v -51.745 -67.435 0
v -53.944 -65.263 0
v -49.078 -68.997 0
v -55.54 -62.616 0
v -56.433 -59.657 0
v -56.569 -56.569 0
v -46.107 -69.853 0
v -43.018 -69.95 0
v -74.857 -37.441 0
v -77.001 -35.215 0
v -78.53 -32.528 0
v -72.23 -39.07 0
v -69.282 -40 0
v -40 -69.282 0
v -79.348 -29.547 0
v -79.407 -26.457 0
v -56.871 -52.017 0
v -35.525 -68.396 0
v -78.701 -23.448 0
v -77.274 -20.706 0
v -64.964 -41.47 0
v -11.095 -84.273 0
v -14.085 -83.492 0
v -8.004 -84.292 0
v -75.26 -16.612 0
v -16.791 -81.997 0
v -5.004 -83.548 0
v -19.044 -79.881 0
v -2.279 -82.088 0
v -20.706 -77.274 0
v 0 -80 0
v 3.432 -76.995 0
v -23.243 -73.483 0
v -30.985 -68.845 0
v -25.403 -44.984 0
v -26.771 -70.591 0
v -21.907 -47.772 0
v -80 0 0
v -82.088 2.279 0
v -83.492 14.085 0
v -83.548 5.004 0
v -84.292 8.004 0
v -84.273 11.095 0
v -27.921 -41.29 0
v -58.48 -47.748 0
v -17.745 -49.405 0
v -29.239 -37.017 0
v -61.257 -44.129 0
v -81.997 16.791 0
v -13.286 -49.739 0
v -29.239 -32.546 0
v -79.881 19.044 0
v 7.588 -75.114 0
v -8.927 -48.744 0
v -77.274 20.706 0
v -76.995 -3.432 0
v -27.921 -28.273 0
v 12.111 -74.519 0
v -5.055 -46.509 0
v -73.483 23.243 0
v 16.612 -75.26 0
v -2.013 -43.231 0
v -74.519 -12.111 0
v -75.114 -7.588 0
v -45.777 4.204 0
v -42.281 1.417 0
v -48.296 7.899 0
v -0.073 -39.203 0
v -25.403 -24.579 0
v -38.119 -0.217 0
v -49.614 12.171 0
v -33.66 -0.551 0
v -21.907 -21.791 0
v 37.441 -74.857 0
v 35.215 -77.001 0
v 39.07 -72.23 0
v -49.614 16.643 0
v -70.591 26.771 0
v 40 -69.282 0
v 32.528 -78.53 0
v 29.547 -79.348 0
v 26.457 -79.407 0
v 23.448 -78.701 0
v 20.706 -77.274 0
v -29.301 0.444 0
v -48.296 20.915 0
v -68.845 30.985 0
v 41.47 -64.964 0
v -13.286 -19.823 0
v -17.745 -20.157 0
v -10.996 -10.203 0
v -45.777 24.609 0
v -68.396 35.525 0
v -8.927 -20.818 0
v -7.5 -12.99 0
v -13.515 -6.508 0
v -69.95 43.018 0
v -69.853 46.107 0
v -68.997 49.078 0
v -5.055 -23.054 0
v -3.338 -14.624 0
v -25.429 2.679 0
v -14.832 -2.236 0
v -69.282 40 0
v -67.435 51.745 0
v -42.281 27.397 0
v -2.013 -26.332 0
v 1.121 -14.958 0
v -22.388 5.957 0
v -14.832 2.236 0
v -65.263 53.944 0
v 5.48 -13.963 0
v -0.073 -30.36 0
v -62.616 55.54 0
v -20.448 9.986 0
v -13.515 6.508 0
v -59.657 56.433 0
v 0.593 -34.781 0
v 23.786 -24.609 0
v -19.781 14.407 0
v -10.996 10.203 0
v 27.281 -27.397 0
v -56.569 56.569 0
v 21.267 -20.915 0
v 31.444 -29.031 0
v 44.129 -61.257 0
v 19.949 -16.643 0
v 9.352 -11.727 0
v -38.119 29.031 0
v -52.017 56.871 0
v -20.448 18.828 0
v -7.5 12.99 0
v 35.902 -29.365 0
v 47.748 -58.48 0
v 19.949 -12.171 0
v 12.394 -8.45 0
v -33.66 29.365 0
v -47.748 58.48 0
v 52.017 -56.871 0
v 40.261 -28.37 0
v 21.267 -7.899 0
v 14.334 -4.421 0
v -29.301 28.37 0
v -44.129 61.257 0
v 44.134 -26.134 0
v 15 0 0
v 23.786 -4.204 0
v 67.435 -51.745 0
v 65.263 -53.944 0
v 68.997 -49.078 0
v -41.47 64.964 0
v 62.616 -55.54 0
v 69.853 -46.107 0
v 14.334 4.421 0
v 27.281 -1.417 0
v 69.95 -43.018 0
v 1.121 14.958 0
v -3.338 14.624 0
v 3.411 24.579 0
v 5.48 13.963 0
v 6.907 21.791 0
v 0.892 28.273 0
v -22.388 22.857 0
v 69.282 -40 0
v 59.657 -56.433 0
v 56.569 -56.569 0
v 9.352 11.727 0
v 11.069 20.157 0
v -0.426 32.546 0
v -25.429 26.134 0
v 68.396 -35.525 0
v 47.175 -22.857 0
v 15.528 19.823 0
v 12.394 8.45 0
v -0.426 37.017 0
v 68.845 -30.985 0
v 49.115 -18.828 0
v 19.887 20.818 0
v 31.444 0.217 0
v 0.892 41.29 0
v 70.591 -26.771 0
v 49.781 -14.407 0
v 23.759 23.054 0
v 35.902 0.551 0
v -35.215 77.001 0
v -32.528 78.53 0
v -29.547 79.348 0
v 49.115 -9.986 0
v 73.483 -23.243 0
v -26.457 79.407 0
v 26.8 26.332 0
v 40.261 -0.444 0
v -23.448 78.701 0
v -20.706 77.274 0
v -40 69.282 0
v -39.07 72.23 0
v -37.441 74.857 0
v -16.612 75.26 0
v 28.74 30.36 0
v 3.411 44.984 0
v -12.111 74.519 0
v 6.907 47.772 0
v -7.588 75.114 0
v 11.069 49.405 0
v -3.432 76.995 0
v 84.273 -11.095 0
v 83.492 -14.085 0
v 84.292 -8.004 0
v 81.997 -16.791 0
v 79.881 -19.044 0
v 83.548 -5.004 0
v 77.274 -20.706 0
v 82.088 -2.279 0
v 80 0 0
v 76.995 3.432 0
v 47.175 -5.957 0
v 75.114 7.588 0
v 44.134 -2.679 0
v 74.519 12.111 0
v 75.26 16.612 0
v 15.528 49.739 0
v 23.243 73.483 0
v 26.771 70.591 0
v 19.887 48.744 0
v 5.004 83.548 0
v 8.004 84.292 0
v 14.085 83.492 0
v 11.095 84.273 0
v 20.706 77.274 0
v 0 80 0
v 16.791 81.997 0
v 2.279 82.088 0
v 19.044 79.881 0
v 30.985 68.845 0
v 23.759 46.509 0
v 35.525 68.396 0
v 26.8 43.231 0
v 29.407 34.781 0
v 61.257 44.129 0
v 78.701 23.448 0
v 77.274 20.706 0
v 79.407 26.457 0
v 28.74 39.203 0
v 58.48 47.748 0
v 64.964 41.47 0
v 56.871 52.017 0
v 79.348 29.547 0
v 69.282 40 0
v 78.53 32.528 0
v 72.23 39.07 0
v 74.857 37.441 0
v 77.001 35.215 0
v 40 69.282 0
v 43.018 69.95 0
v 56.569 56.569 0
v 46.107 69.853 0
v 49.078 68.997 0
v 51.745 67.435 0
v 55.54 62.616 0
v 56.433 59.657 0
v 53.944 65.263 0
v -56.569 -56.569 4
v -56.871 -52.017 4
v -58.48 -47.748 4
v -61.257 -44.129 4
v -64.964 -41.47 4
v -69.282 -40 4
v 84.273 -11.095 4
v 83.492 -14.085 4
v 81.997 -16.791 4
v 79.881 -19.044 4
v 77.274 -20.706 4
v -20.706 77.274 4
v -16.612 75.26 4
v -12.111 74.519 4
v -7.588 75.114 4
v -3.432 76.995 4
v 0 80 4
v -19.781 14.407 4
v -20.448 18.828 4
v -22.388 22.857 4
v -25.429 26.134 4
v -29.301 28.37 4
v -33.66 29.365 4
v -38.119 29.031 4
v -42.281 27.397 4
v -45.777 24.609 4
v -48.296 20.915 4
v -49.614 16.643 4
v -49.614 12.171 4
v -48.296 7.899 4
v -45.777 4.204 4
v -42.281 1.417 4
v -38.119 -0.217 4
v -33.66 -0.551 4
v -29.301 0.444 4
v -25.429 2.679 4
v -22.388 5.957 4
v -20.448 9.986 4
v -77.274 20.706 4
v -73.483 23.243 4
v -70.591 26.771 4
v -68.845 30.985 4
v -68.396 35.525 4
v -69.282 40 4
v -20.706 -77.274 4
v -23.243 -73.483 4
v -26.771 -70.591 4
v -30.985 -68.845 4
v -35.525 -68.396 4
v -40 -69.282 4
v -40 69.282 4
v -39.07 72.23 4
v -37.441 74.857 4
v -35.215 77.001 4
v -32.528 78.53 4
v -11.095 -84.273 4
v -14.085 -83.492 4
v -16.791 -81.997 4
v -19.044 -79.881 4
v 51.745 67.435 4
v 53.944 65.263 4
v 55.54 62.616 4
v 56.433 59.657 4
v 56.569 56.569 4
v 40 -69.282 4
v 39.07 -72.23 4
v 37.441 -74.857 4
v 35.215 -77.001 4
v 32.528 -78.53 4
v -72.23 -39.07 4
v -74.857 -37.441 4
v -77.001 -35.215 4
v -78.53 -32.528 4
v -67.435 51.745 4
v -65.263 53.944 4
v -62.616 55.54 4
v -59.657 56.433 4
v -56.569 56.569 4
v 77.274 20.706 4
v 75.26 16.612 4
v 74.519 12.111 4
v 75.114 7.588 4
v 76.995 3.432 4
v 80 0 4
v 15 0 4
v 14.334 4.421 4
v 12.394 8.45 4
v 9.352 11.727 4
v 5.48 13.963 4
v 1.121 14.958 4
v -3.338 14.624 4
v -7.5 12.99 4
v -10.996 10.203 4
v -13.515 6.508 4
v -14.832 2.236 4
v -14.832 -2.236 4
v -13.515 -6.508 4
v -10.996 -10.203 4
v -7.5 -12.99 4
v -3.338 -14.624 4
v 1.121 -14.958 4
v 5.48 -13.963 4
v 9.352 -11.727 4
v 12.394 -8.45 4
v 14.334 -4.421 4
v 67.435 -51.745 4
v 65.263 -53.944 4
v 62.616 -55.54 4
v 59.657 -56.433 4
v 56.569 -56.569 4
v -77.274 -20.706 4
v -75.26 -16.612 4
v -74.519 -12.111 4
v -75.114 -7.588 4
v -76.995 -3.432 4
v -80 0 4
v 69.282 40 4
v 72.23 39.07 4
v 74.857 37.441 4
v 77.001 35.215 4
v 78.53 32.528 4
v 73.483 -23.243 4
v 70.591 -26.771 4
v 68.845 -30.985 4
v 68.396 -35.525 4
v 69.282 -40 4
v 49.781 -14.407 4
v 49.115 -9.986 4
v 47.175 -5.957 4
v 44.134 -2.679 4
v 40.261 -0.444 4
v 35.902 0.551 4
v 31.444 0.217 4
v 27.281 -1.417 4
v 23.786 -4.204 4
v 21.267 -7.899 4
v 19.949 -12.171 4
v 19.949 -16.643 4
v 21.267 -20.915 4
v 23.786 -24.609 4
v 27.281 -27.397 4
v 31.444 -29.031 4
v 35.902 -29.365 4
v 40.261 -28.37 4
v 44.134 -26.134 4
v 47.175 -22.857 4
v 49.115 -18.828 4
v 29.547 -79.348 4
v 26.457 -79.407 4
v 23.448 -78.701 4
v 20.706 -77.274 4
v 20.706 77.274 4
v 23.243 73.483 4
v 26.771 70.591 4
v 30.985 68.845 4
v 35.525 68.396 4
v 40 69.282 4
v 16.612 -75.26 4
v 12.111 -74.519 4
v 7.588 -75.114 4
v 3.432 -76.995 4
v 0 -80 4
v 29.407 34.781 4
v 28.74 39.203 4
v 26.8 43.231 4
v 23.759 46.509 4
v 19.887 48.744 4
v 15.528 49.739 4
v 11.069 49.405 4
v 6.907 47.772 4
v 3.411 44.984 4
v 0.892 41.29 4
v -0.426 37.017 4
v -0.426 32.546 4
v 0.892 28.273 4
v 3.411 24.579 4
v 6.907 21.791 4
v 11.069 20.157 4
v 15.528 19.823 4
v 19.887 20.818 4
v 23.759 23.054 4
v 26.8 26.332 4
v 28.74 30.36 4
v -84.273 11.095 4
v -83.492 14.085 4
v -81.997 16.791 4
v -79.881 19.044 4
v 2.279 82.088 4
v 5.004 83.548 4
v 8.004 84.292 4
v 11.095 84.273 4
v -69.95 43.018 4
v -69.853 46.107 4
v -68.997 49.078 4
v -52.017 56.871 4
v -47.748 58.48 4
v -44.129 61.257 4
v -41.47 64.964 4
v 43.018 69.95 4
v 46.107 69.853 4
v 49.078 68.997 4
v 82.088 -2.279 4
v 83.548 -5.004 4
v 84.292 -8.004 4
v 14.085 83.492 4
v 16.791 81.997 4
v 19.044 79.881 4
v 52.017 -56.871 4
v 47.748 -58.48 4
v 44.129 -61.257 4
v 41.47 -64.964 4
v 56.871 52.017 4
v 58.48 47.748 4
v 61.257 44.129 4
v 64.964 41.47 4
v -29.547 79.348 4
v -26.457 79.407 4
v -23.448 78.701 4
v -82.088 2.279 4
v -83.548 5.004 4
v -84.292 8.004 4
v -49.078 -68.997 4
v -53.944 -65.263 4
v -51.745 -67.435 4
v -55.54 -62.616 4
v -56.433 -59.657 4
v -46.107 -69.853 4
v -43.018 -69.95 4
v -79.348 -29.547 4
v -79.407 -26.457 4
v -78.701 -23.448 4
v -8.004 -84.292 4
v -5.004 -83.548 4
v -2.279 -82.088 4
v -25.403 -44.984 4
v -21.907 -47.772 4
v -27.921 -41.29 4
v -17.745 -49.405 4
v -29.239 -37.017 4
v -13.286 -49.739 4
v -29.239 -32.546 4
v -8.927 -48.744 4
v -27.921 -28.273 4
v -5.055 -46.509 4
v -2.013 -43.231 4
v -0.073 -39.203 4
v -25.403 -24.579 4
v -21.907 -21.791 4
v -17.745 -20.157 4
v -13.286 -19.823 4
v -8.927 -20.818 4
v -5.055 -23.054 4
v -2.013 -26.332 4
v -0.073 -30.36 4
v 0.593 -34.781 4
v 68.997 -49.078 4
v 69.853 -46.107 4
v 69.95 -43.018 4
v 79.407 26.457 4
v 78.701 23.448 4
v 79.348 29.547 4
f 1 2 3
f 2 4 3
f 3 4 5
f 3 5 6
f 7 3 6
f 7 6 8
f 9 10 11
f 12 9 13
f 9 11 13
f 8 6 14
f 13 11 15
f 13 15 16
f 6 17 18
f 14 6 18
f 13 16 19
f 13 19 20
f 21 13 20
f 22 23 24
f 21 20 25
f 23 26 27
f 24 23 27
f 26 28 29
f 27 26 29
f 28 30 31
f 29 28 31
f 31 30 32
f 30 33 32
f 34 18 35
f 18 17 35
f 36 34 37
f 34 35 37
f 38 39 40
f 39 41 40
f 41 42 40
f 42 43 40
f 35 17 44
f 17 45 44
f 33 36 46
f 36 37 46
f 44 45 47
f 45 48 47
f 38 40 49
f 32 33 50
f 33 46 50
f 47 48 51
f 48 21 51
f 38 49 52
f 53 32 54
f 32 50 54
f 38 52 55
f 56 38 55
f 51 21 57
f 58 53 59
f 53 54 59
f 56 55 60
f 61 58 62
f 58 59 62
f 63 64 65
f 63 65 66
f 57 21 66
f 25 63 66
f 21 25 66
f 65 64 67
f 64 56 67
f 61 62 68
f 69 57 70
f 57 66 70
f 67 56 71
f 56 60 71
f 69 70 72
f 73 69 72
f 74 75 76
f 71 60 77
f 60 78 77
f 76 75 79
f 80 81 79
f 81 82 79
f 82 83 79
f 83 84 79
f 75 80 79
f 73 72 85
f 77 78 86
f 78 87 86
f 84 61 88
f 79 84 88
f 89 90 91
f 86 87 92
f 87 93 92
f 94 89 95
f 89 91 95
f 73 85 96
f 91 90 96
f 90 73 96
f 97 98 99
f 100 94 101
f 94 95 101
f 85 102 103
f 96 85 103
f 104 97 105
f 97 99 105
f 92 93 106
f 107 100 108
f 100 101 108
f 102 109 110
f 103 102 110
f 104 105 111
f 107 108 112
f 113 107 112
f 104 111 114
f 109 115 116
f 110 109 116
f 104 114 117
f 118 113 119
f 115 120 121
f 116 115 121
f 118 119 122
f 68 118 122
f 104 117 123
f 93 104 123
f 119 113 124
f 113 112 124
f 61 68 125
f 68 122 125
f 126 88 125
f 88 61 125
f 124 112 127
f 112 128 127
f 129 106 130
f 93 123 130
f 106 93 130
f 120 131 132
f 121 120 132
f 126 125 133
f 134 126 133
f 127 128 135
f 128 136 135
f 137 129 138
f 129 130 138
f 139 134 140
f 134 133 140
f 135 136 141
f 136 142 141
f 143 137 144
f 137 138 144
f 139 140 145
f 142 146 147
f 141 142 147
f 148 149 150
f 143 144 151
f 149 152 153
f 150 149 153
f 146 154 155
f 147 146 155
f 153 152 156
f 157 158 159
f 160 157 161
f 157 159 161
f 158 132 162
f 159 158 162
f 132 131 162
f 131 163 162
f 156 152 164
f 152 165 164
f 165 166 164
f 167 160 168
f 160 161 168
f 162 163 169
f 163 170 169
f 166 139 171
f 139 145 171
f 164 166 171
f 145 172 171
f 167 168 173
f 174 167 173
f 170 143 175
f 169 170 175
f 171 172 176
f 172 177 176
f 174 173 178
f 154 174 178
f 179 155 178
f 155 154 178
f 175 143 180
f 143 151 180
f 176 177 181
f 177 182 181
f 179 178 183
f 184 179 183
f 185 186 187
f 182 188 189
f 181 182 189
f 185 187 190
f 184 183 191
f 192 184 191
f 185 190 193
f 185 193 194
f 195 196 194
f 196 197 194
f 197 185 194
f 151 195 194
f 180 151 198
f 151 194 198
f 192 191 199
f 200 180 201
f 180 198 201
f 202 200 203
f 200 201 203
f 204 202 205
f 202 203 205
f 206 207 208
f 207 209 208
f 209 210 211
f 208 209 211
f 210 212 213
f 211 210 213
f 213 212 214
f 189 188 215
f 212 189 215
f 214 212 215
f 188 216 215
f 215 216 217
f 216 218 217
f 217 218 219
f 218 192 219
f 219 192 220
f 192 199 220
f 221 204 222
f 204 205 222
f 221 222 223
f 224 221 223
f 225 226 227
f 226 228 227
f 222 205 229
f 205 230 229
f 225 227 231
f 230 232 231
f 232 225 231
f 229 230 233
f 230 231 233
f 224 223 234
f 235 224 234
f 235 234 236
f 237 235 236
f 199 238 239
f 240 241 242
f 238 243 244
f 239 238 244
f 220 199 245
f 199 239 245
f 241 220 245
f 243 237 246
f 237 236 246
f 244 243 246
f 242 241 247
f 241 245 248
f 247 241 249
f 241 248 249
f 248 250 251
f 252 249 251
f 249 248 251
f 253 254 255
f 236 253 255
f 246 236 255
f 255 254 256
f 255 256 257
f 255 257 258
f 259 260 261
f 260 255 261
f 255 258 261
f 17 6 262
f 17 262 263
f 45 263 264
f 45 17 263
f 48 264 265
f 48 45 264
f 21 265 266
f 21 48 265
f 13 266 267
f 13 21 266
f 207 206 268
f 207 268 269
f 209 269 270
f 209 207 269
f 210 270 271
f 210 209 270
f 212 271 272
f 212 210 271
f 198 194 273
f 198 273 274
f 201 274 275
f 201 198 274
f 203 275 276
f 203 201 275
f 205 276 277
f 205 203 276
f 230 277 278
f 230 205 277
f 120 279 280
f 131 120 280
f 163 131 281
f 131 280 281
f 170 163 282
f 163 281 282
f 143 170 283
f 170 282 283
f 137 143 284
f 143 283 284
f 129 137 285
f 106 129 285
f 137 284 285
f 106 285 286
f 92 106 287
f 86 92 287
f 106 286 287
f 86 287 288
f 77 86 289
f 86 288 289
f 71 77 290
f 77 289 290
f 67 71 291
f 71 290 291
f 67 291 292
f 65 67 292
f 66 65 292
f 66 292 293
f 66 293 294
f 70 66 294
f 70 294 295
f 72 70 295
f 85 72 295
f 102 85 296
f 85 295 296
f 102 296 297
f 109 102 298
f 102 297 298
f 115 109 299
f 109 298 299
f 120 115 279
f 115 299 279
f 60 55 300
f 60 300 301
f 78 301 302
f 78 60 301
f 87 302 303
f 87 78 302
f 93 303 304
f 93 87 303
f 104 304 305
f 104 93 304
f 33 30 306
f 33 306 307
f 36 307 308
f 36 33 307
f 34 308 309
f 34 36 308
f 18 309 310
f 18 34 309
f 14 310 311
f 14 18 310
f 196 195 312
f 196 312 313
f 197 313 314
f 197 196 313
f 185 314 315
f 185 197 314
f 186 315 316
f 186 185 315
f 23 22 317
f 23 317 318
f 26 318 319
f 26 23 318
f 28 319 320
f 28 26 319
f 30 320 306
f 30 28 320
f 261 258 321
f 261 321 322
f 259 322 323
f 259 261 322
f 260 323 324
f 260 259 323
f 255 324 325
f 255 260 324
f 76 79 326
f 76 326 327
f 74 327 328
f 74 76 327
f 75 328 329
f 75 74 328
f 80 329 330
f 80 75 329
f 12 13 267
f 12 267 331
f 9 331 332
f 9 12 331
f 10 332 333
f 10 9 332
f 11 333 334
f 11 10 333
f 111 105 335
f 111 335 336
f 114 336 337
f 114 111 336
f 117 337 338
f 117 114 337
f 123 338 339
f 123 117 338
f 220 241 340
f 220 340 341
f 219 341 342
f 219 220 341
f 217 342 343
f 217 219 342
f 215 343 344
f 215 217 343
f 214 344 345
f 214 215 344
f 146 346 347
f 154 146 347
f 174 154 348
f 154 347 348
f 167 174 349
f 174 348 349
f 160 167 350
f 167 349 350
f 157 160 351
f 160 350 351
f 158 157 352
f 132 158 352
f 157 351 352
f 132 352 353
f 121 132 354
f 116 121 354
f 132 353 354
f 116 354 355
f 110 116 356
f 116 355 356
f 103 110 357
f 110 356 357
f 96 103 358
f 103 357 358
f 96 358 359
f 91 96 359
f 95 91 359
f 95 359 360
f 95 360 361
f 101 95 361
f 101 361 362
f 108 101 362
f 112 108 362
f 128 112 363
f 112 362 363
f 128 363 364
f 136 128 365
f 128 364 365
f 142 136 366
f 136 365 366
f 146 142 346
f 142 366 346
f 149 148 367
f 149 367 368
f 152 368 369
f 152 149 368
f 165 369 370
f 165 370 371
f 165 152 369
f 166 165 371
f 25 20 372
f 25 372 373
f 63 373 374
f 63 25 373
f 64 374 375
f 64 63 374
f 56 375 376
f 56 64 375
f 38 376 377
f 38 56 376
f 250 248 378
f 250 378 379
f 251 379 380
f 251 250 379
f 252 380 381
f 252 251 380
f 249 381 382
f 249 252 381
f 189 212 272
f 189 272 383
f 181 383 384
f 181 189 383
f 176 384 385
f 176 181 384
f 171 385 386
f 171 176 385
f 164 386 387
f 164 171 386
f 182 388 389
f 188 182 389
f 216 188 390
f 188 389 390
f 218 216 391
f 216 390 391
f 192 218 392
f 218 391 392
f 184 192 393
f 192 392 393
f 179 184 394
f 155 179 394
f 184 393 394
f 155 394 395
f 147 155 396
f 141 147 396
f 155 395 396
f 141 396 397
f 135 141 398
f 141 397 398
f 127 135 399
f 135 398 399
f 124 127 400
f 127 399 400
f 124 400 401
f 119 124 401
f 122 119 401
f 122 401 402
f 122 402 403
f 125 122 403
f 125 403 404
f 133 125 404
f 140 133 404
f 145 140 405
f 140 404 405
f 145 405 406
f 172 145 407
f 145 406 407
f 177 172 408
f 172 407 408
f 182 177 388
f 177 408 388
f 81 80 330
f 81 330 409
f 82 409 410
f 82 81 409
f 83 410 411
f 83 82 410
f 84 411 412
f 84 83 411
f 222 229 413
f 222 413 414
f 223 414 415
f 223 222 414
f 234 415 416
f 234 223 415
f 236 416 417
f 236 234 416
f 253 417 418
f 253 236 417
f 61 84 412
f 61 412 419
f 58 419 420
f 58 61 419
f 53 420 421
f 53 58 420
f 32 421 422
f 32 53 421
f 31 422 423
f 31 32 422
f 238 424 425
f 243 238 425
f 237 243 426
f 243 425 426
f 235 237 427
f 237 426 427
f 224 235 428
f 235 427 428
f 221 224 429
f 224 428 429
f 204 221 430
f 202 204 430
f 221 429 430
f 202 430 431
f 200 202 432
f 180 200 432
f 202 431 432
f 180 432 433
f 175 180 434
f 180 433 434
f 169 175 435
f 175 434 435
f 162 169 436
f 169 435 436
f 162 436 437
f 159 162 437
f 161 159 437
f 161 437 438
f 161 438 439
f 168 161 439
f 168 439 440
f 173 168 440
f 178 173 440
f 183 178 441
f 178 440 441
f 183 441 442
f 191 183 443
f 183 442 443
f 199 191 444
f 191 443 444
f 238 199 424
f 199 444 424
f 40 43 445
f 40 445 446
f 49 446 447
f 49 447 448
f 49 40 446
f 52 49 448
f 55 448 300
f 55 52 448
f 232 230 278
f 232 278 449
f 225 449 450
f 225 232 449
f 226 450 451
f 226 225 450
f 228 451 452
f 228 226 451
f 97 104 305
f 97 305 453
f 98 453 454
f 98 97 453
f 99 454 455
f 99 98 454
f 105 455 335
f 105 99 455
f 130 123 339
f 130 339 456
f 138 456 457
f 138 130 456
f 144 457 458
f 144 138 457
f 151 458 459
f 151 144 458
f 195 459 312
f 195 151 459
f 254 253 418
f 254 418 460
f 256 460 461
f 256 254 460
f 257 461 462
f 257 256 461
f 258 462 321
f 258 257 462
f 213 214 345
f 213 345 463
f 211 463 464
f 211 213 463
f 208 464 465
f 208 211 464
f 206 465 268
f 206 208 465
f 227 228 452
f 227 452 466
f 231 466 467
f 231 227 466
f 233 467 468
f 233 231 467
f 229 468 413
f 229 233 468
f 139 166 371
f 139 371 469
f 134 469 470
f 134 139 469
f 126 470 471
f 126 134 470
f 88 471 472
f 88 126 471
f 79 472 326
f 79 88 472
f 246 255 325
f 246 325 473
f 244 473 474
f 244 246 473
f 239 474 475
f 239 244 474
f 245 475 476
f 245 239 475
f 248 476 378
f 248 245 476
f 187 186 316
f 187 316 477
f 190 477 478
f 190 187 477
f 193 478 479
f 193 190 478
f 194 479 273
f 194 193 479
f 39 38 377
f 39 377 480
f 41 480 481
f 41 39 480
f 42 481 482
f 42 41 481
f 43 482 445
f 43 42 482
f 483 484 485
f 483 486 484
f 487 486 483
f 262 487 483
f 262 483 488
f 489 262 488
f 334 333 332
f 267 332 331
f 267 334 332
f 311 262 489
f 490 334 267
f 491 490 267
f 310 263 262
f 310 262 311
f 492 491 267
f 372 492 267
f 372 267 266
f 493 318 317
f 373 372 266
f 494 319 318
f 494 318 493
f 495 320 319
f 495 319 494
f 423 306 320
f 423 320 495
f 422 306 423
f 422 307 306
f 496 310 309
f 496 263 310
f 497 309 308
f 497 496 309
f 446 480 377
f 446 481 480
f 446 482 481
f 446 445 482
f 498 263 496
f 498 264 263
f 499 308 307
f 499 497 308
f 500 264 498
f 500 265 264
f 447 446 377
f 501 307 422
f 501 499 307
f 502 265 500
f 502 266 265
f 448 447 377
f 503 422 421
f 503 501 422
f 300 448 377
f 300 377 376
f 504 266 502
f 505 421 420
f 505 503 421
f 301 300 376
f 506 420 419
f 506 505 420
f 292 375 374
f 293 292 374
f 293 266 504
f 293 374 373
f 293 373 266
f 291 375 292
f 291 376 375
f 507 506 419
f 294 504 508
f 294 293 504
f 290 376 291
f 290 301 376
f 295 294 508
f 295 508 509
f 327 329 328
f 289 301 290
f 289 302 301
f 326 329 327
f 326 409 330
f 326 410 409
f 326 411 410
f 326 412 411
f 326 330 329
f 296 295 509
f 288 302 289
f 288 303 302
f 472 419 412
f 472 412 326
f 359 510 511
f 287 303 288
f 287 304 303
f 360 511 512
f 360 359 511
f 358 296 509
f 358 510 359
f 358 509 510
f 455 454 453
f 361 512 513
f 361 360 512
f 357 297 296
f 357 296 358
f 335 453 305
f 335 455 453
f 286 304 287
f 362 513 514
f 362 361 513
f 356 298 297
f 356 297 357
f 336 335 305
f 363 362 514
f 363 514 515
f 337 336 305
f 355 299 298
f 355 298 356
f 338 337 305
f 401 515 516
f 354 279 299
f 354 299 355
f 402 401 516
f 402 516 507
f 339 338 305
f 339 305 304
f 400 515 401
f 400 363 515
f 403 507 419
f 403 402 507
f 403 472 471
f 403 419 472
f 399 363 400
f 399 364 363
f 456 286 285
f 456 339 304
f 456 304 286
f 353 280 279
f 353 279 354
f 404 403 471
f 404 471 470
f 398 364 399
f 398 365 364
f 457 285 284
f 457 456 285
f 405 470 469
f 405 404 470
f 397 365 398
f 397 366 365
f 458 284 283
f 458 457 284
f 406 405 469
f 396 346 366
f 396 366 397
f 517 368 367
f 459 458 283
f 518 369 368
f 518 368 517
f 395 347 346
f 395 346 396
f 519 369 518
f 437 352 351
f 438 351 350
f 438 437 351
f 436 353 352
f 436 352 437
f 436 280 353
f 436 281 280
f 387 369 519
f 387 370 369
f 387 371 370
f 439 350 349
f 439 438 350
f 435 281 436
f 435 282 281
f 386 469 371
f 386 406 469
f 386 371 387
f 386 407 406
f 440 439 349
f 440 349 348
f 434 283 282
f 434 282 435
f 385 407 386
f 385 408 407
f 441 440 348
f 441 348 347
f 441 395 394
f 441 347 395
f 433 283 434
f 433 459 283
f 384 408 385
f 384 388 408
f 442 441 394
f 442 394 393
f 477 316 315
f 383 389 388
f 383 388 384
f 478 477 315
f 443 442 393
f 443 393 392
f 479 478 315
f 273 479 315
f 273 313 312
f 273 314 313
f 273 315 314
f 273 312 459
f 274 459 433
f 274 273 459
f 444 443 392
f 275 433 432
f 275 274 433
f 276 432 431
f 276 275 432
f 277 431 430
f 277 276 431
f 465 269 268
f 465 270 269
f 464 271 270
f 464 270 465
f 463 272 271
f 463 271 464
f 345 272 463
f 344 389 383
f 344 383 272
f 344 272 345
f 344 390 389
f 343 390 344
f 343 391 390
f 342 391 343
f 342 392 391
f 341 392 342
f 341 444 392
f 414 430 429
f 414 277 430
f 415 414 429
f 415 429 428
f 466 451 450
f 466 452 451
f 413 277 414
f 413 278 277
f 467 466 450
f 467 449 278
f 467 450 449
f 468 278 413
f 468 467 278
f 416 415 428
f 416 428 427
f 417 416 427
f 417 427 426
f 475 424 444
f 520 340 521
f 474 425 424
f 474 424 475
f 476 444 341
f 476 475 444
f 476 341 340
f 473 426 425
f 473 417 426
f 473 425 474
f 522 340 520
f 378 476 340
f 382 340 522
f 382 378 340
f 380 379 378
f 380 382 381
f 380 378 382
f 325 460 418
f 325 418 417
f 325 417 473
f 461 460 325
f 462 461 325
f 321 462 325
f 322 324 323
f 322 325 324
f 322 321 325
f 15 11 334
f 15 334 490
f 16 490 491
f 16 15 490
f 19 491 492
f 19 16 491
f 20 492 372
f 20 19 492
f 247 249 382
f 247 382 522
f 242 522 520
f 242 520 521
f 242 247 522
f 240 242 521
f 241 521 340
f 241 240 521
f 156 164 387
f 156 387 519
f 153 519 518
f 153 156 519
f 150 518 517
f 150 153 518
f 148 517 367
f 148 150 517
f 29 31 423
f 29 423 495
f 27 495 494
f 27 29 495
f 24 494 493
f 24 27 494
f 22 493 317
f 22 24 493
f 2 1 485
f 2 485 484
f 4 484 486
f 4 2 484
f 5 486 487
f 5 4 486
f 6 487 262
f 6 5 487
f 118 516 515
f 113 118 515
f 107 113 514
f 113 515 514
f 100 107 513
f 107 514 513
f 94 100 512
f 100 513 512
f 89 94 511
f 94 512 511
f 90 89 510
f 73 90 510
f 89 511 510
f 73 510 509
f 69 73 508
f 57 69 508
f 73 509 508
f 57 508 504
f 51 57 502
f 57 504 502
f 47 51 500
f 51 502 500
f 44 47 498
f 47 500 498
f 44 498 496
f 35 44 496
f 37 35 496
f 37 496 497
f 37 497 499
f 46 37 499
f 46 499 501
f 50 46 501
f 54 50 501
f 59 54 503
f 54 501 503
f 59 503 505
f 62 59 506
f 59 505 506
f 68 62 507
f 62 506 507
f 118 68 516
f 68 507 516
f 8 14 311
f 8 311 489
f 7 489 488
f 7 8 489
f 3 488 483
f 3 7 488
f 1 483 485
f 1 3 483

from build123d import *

# Parameters (mm, degrees)
CROQUIS3_R              = 85
SALIENTE_EXTRUIR1_DEPTH = 4
CORTAR_EXTRUIR1_START   = -4
CORTAR_EXTRUIR1_DEPTH   = 4
CROQUIS5_R              = 15
CORTAR_EXTRUIR2_DEPTH   = 4
CROQUIS6_R              = 15
CORTAR_EXTRUIR3_DEPTH   = 4


with BuildPart() as part:
    # Croquis3 → Saliente-Extruir1 (new body)
    with BuildSketch(Plane.XY):
        Circle(CROQUIS3_R)
    extrude(amount=SALIENTE_EXTRUIR1_DEPTH)

    # Croquis4 → Cortar-Extruir1 (cut)
    with BuildSketch(Plane.XY.offset(4).offset(CORTAR_EXTRUIR1_START)):
        with BuildLine():
            ThreePointArc((51.744720944, 67.435034325), (32.528091082, 78.52976054), (11.094725556, 84.27281332))
            ThreePointArc((11.094725556, 84.27281332), (16.790892389, 81.996657131), (20.705523608, 77.274066103))
            ThreePointArc((20.705523608, 77.274066103), (28.813811378, 69.562694213), (40, 69.282032303))
            ThreePointArc((40, 69.282032303), (46.107437706, 69.853346275), (51.744720944, 67.435034325))
        make_face()
        with BuildLine():
            ThreePointArc((-20.705523608, 77.274066103), (-10.442095378, 79.31558891), (0, 80))
            ThreePointArc((0, 80), (5.003539158, 83.548491243), (11.094725556, 84.27281332))
            ThreePointArc((11.094725556, 84.27281332), (-11.094726837, 84.272813151), (-32.52809195, 78.529760181))
            ThreePointArc((-32.52809195, 78.529760181), (-26.456988918, 79.406634265), (-20.705523608, 77.274066103))
        make_face()
        with BuildLine():
            ThreePointArc((-20.705523608, 77.274066103), (-9.827854473, 74.649966033), (0, 80))
            ThreePointArc((0, 80), (-10.442095378, 79.31558891), (-20.705523608, 77.274066103))
        make_face()
        with BuildLine():
            ThreePointArc((-40, 69.282032303), (-37.441053421, 74.856885666), (-32.52809195, 78.529760181))
            ThreePointArc((-32.52809195, 78.529760181), (-51.744721795, 67.435033672), (-67.435034299, 51.744720978))
            ThreePointArc((-67.435034299, 51.744720978), (-62.615741826, 55.539667962), (-56.568542495, 56.568542495))
            ThreePointArc((-56.568542495, 56.568542495), (-48.700914321, 63.468267223), (-40, 69.282032303))
        make_face()
        with BuildLine():
            ThreePointArc((-56.568542495, 56.568542495), (-45.836154655, 59.73483974), (-40, 69.282032303))
            ThreePointArc((-40, 69.282032303), (-48.700914321, 63.468267223), (-56.568542495, 56.568542495))
        make_face()
        with BuildLine():
            ThreePointArc((-69.282032303, 40), (-69.853346272, 46.107437728), (-67.435034299, 51.744720978))
            ThreePointArc((-67.435034299, 51.744720978), (-78.529760525, 32.528091121), (-84.272813315, 11.094725594))
            ThreePointArc((-84.272813315, 11.094725594), (-81.996657119, 16.790892405), (-77.274066103, 20.705523608))
            ThreePointArc((-77.274066103, 20.705523608), (-73.910362601, 30.614674589), (-69.282032303, 40))
        make_face()
        with BuildLine():
            ThreePointArc((-77.274066103, 20.705523608), (-69.562694213, 28.813811378), (-69.282032303, 40))
            ThreePointArc((-69.282032303, 40), (-73.910362601, 30.614674589), (-77.274066103, 20.705523608))
        make_face()
        with BuildLine():
            ThreePointArc((-80, 0), (-83.54849125, 5.003539176), (-84.272813315, 11.094725594))
            ThreePointArc((-84.272813315, 11.094725594), (-84.272813233, -11.094726218), (-78.529760644, -32.528090833))
            ThreePointArc((-78.529760644, -32.528090833), (-79.406634201, -26.456988317), (-77.274066103, -20.705523608))
            ThreePointArc((-77.274066103, -20.705523608), (-79.31558891, -10.442095378), (-80, 0))
        make_face()
        with BuildLine():
            ThreePointArc((-77.274066103, -20.705523608), (-74.649966033, -9.827854473), (-80, 0))
            ThreePointArc((-80, 0), (-79.31558891, -10.442095378), (-77.274066103, -20.705523608))
        make_face()
        with BuildLine():
            ThreePointArc((-69.282032303, -40), (-74.856886137, -37.441053042), (-78.529760644, -32.528090833))
            ThreePointArc((-78.529760644, -32.528090833), (-67.435033831, -51.744721588), (-51.744720432, -67.435034718))
            ThreePointArc((-51.744720432, -67.435034718), (-55.539667823, -62.61574214), (-56.568542495, -56.568542495))
            ThreePointArc((-56.568542495, -56.568542495), (-63.468267223, -48.700914321), (-69.282032303, -40))
        make_face()
        with BuildLine():
            ThreePointArc((-56.568542495, -56.568542495), (-59.73483974, -45.836154655), (-69.282032303, -40))
            ThreePointArc((-69.282032303, -40), (-63.468267223, -48.700914321), (-56.568542495, -56.568542495))
        make_face()
        with BuildLine():
            ThreePointArc((-40, -69.282032303), (-46.107437388, -69.853346325), (-51.744720432, -67.435034718))
            ThreePointArc((-51.744720432, -67.435034718), (-32.528090639, -78.529760724), (-11.094725244, -84.272813361))
            ThreePointArc((-11.094725244, -84.272813361), (-16.790892262, -81.996657223), (-20.705523608, -77.274066103))
            ThreePointArc((-20.705523608, -77.274066103), (-30.614674589, -73.910362601), (-40, -69.282032303))
        make_face()
        with BuildLine():
            ThreePointArc((-20.705523608, -77.274066103), (-28.813811378, -69.562694213), (-40, -69.282032303))
            ThreePointArc((-40, -69.282032303), (-30.614674589, -73.910362601), (-20.705523608, -77.274066103))
        make_face()
        with BuildLine():
            ThreePointArc((-11.094725244, -84.272813361), (11.09472631, -84.272813221), (32.528090677, -78.529760708))
            ThreePointArc((32.528090677, -78.529760708), (26.456988234, -79.406634192), (20.705523608, -77.274066103))
            ThreePointArc((20.705523608, -77.274066103), (10.442095378, -79.31558891), (0, -80))
            ThreePointArc((0, -80), (-5.003539011, -83.548491186), (-11.094725244, -84.272813361))
        make_face()
        with BuildLine():
            ThreePointArc((0, -80), (10.442095378, -79.31558891), (20.705523608, -77.274066103))
            ThreePointArc((20.705523608, -77.274066103), (9.827854473, -74.649966033), (0, -80))
        make_face()
        with BuildLine():
            ThreePointArc((40, -69.282032303), (48.700914321, -63.468267223), (56.568542495, -56.568542495))
            ThreePointArc((56.568542495, -56.568542495), (45.836154655, -59.73483974), (40, -69.282032303))
        make_face()
        with BuildLine():
            ThreePointArc((32.528090677, -78.529760708), (51.74472148, -67.435033914), (67.435034654, -51.744720516))
            ThreePointArc((67.435034654, -51.744720516), (62.615742092, -55.539667844), (56.568542495, -56.568542495))
            ThreePointArc((56.568542495, -56.568542495), (48.700914321, -63.468267223), (40, -69.282032303))
            ThreePointArc((40, -69.282032303), (37.441052989, -74.856886202), (32.528090677, -78.529760708))
        make_face()
        with BuildLine():
            ThreePointArc((67.435034654, -51.744720516), (78.529760638, -32.528090847), (84.272813316, -11.094725585))
            ThreePointArc((84.272813316, -11.094725585), (81.996657122, -16.790892401), (77.274066103, -20.705523608))
            ThreePointArc((77.274066103, -20.705523608), (73.910362601, -30.614674589), (69.282032303, -40))
            ThreePointArc((69.282032303, -40), (69.853346317, -46.10743744), (67.435034654, -51.744720516))
        make_face()
        with BuildLine():
            ThreePointArc((69.282032303, -40), (73.910362601, -30.614674589), (77.274066103, -20.705523608))
            ThreePointArc((77.274066103, -20.705523608), (69.562694213, -28.813811378), (69.282032303, -40))
        make_face()
        with BuildLine():
            ThreePointArc((85, 0), (83.36674891, 16.582676993), (78.529760559, 32.528091037))
            ThreePointArc((78.529760559, 32.528091037), (79.406634213, 26.456988427), (77.274066103, 20.705523608))
            ThreePointArc((77.274066103, 20.705523608), (79.31558891, 10.442095378), (80, 0))
            ThreePointArc((80, 0), (83.548491248, -5.003539172), (84.272813316, -11.094725585))
            ThreePointArc((84.272813316, -11.094725585), (84.8180085, -5.559265605), (85, 0))
        make_face()
        with BuildLine():
            ThreePointArc((80, 0), (79.31558891, 10.442095378), (77.274066103, 20.705523608))
            ThreePointArc((77.274066103, 20.705523608), (74.649966033, 9.827854473), (80, 0))
        make_face()
        with BuildLine():
            ThreePointArc((78.529760559, 32.528091037), (67.43503396, 51.74472142), (51.744720944, 67.435034325))
            ThreePointArc((51.744720944, 67.435034325), (55.539667954, 62.615741846), (56.568542495, 56.568542495))
            ThreePointArc((56.568542495, 56.568542495), (63.468267223, 48.700914321), (69.282032303, 40))
            ThreePointArc((69.282032303, 40), (74.856886051, 37.441053111), (78.529760559, 32.528091037))
        make_face()
        with BuildLine():
            ThreePointArc((69.282032303, 40), (63.468267223, 48.700914321), (56.568542495, 56.568542495))
            ThreePointArc((56.568542495, 56.568542495), (59.73483974, 45.836154655), (69.282032303, 40))
        make_face()
    extrude(amount=CORTAR_EXTRUIR1_DEPTH, mode=Mode.SUBTRACT)

    # Croquis5 → Cortar-Extruir2 (cut)
    with BuildSketch(Plane.XY.offset(4)):
        Circle(CROQUIS5_R)
    extrude(amount=-CORTAR_EXTRUIR2_DEPTH, mode=Mode.SUBTRACT)

    # Croquis6 → Cortar-Extruir3 (cut)
    with BuildSketch(Plane.XY.offset(4)):
        with Locations((14.406905689, 34.781347106)):
            Circle(CROQUIS6_R)
        with Locations((34.781347106, -14.406905689)):
            Circle(CROQUIS6_R)
        with Locations((-14.406905689, -34.781347106)):
            Circle(CROQUIS6_R)
        with Locations((-34.781347106, 14.406905689)):
            Circle(CROQUIS6_R)
    extrude(amount=-CORTAR_EXTRUIR3_DEPTH, mode=Mode.SUBTRACT)


solid = part.part
